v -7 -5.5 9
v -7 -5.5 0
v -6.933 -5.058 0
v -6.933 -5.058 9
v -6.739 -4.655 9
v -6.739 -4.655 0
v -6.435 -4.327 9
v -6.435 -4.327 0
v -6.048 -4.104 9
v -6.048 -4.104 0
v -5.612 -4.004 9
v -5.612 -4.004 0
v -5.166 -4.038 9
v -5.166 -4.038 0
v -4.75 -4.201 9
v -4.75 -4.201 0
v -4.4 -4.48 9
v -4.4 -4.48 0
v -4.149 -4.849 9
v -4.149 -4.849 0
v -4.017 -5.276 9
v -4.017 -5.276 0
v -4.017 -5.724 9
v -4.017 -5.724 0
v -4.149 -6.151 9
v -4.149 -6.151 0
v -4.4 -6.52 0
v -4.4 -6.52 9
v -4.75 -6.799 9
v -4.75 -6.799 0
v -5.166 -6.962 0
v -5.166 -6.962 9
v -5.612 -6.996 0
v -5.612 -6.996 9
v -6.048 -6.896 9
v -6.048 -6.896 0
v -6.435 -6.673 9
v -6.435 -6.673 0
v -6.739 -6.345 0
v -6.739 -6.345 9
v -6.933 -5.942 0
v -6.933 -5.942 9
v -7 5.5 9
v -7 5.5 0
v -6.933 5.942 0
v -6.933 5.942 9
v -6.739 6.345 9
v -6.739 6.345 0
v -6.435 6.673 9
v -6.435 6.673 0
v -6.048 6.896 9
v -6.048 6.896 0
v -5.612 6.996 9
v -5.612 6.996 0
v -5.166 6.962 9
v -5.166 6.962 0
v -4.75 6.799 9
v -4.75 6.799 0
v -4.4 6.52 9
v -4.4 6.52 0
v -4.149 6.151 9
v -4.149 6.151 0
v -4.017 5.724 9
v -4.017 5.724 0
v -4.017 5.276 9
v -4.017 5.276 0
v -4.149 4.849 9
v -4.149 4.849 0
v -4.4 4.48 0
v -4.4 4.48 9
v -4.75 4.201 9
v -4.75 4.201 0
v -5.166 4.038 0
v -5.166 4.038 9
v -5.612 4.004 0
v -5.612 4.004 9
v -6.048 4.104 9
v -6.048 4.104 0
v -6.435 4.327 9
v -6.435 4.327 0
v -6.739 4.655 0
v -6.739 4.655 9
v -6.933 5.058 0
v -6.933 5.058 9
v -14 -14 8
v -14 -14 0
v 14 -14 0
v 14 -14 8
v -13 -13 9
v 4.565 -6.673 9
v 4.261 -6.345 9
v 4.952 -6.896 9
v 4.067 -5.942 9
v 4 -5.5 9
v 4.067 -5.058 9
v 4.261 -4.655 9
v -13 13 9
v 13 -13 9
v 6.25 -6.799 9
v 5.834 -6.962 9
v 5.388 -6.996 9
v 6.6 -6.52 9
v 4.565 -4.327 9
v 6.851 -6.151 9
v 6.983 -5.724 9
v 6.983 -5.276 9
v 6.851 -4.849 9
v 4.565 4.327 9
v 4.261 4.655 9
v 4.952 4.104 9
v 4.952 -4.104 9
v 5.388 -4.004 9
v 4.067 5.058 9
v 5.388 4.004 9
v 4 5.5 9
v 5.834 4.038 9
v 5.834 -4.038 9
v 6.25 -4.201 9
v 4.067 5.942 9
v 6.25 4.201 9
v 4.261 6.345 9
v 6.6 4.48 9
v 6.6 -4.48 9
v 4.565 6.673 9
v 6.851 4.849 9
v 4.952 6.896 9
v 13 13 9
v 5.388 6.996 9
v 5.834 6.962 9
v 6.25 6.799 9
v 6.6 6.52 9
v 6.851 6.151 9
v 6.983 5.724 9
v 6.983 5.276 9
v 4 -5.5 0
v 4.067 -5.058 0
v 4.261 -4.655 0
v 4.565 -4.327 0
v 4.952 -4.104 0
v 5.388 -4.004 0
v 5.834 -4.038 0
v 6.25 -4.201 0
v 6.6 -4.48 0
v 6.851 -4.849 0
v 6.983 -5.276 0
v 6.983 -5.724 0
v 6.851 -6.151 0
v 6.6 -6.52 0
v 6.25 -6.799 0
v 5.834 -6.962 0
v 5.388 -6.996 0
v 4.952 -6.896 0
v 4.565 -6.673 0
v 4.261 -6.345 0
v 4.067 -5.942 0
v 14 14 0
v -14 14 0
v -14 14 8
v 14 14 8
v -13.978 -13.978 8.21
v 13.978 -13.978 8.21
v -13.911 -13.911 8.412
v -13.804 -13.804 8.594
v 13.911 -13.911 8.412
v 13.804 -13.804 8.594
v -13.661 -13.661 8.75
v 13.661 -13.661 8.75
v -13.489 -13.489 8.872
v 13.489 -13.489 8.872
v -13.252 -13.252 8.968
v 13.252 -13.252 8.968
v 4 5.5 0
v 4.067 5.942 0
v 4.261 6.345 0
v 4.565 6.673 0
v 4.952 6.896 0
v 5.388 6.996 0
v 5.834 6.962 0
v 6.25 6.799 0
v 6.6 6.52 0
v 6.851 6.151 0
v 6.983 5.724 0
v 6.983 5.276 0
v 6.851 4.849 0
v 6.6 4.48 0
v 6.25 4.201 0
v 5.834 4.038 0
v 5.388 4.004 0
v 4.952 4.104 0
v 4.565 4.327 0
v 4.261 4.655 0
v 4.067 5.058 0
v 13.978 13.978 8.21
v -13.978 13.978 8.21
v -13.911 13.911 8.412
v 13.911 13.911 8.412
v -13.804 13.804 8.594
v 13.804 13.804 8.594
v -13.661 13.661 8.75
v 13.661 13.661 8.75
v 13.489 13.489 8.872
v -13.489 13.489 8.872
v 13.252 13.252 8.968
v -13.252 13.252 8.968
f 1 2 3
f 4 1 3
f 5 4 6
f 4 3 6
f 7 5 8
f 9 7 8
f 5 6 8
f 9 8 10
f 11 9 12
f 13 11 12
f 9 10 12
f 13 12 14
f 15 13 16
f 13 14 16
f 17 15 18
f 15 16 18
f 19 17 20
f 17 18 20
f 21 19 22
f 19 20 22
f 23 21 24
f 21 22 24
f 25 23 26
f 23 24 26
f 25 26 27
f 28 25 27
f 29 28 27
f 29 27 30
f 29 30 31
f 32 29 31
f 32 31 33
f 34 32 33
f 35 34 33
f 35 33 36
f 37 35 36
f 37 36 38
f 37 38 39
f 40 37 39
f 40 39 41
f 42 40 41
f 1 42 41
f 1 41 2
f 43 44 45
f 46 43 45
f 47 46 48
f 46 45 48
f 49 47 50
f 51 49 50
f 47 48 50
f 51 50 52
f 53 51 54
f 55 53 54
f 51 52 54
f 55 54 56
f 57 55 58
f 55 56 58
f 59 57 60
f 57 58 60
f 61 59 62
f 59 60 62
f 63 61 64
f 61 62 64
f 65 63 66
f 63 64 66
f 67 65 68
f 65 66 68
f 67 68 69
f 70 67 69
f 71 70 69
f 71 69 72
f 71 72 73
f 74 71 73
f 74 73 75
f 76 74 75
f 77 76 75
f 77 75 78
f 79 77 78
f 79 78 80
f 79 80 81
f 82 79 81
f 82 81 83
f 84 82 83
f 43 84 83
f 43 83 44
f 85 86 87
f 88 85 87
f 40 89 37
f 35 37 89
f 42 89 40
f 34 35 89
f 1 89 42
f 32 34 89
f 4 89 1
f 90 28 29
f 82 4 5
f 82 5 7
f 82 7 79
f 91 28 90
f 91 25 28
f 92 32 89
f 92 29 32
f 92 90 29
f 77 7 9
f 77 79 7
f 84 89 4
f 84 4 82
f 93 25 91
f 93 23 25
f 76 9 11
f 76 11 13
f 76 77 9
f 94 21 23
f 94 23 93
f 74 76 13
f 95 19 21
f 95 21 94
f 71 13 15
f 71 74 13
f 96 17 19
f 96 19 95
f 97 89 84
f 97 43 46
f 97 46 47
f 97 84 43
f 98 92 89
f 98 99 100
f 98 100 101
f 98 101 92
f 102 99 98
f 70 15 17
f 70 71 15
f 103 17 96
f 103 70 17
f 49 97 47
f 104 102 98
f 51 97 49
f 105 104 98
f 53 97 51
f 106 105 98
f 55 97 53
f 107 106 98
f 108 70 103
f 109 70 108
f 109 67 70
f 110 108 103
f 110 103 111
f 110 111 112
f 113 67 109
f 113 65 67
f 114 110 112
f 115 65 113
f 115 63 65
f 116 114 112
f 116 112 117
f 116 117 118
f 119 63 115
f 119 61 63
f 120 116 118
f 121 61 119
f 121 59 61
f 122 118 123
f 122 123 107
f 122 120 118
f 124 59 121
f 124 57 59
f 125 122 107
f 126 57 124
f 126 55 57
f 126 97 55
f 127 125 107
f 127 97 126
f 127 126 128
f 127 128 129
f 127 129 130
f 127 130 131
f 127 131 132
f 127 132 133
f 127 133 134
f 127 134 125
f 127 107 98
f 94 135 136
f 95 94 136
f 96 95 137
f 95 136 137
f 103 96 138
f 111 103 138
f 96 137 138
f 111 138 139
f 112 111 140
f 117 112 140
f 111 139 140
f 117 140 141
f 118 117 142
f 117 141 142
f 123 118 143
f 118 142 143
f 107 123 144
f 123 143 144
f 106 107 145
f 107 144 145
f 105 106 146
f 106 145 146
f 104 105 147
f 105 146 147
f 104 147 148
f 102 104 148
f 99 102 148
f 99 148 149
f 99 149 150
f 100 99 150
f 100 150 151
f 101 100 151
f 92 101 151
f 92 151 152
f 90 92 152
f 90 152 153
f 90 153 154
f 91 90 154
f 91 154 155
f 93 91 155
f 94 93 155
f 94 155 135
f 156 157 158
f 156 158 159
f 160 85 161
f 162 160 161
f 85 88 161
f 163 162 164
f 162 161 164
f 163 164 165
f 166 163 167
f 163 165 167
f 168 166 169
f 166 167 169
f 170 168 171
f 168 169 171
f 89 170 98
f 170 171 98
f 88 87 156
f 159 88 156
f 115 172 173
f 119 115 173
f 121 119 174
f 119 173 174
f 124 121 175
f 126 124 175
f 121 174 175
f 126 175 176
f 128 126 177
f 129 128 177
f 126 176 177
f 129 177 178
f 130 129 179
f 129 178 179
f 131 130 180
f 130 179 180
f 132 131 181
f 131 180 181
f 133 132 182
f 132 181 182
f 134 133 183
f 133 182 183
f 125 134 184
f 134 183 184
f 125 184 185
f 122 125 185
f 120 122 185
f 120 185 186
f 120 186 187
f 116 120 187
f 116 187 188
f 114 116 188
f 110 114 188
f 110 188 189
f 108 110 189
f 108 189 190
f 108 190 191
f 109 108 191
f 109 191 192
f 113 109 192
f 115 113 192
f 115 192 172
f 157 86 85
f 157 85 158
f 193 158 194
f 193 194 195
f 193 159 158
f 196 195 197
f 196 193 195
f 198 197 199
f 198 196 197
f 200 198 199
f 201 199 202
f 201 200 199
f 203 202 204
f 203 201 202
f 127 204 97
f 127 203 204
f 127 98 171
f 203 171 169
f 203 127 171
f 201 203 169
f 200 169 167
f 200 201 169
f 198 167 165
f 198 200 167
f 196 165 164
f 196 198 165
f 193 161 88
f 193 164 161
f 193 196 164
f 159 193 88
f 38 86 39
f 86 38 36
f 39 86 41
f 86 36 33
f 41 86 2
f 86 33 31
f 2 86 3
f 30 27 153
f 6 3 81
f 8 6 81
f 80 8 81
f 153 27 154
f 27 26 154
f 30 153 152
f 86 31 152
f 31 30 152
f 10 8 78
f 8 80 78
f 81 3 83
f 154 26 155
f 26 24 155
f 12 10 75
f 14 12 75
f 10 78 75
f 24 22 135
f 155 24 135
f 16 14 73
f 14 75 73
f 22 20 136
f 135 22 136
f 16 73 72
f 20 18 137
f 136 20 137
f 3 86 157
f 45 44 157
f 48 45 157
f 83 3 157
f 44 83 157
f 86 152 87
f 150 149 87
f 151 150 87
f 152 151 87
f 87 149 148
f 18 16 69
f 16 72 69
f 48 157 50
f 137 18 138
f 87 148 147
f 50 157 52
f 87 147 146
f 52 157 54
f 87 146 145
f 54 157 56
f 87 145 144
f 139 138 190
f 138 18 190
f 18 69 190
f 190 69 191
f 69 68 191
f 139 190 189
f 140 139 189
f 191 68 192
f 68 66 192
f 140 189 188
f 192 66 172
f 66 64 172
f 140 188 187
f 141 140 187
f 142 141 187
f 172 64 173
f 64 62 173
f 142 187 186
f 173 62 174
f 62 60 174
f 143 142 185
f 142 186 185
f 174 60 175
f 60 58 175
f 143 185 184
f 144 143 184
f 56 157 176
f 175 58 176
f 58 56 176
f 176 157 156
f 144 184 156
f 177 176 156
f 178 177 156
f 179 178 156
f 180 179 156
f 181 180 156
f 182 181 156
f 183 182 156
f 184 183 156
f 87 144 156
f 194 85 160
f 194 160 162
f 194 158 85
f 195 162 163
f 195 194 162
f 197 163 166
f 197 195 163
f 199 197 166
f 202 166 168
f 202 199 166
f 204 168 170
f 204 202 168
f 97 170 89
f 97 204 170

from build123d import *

# Parameters (mm, degrees)
F0_W     = 28
F0_H     = 28
F1_DEPTH = 9
F3_D     = 3
F4_R     = 1


# Not quite as in the source:
# - a feature names something its author has since deleted; it is built from what else it names


with BuildPart() as f1:
    # F0 (on Top) → F1 (new body)
    with BuildSketch(Plane.XY):
        Rectangle(F0_W, F0_H)
    extrude(amount=F1_DEPTH)

    # F3 (through all)
    with Locations(Plane.XY.offset(9)):
        with Locations((5.5, 5.5), (-5.5, 5.5), (-5.5, -5.5), (5.5, -5.5)):
            Hole(F3_D / 2)

    # F4
    f4_edges = [f1.edges().sort_by_distance(p)[0] for p in [
        (0, 14, 9),
        (-14, 0, 9),
        (0, -14, 9),
        (14, 0, 9),
    ]]
    fillet(f4_edges, radius=F4_R)


solid = f1.part
